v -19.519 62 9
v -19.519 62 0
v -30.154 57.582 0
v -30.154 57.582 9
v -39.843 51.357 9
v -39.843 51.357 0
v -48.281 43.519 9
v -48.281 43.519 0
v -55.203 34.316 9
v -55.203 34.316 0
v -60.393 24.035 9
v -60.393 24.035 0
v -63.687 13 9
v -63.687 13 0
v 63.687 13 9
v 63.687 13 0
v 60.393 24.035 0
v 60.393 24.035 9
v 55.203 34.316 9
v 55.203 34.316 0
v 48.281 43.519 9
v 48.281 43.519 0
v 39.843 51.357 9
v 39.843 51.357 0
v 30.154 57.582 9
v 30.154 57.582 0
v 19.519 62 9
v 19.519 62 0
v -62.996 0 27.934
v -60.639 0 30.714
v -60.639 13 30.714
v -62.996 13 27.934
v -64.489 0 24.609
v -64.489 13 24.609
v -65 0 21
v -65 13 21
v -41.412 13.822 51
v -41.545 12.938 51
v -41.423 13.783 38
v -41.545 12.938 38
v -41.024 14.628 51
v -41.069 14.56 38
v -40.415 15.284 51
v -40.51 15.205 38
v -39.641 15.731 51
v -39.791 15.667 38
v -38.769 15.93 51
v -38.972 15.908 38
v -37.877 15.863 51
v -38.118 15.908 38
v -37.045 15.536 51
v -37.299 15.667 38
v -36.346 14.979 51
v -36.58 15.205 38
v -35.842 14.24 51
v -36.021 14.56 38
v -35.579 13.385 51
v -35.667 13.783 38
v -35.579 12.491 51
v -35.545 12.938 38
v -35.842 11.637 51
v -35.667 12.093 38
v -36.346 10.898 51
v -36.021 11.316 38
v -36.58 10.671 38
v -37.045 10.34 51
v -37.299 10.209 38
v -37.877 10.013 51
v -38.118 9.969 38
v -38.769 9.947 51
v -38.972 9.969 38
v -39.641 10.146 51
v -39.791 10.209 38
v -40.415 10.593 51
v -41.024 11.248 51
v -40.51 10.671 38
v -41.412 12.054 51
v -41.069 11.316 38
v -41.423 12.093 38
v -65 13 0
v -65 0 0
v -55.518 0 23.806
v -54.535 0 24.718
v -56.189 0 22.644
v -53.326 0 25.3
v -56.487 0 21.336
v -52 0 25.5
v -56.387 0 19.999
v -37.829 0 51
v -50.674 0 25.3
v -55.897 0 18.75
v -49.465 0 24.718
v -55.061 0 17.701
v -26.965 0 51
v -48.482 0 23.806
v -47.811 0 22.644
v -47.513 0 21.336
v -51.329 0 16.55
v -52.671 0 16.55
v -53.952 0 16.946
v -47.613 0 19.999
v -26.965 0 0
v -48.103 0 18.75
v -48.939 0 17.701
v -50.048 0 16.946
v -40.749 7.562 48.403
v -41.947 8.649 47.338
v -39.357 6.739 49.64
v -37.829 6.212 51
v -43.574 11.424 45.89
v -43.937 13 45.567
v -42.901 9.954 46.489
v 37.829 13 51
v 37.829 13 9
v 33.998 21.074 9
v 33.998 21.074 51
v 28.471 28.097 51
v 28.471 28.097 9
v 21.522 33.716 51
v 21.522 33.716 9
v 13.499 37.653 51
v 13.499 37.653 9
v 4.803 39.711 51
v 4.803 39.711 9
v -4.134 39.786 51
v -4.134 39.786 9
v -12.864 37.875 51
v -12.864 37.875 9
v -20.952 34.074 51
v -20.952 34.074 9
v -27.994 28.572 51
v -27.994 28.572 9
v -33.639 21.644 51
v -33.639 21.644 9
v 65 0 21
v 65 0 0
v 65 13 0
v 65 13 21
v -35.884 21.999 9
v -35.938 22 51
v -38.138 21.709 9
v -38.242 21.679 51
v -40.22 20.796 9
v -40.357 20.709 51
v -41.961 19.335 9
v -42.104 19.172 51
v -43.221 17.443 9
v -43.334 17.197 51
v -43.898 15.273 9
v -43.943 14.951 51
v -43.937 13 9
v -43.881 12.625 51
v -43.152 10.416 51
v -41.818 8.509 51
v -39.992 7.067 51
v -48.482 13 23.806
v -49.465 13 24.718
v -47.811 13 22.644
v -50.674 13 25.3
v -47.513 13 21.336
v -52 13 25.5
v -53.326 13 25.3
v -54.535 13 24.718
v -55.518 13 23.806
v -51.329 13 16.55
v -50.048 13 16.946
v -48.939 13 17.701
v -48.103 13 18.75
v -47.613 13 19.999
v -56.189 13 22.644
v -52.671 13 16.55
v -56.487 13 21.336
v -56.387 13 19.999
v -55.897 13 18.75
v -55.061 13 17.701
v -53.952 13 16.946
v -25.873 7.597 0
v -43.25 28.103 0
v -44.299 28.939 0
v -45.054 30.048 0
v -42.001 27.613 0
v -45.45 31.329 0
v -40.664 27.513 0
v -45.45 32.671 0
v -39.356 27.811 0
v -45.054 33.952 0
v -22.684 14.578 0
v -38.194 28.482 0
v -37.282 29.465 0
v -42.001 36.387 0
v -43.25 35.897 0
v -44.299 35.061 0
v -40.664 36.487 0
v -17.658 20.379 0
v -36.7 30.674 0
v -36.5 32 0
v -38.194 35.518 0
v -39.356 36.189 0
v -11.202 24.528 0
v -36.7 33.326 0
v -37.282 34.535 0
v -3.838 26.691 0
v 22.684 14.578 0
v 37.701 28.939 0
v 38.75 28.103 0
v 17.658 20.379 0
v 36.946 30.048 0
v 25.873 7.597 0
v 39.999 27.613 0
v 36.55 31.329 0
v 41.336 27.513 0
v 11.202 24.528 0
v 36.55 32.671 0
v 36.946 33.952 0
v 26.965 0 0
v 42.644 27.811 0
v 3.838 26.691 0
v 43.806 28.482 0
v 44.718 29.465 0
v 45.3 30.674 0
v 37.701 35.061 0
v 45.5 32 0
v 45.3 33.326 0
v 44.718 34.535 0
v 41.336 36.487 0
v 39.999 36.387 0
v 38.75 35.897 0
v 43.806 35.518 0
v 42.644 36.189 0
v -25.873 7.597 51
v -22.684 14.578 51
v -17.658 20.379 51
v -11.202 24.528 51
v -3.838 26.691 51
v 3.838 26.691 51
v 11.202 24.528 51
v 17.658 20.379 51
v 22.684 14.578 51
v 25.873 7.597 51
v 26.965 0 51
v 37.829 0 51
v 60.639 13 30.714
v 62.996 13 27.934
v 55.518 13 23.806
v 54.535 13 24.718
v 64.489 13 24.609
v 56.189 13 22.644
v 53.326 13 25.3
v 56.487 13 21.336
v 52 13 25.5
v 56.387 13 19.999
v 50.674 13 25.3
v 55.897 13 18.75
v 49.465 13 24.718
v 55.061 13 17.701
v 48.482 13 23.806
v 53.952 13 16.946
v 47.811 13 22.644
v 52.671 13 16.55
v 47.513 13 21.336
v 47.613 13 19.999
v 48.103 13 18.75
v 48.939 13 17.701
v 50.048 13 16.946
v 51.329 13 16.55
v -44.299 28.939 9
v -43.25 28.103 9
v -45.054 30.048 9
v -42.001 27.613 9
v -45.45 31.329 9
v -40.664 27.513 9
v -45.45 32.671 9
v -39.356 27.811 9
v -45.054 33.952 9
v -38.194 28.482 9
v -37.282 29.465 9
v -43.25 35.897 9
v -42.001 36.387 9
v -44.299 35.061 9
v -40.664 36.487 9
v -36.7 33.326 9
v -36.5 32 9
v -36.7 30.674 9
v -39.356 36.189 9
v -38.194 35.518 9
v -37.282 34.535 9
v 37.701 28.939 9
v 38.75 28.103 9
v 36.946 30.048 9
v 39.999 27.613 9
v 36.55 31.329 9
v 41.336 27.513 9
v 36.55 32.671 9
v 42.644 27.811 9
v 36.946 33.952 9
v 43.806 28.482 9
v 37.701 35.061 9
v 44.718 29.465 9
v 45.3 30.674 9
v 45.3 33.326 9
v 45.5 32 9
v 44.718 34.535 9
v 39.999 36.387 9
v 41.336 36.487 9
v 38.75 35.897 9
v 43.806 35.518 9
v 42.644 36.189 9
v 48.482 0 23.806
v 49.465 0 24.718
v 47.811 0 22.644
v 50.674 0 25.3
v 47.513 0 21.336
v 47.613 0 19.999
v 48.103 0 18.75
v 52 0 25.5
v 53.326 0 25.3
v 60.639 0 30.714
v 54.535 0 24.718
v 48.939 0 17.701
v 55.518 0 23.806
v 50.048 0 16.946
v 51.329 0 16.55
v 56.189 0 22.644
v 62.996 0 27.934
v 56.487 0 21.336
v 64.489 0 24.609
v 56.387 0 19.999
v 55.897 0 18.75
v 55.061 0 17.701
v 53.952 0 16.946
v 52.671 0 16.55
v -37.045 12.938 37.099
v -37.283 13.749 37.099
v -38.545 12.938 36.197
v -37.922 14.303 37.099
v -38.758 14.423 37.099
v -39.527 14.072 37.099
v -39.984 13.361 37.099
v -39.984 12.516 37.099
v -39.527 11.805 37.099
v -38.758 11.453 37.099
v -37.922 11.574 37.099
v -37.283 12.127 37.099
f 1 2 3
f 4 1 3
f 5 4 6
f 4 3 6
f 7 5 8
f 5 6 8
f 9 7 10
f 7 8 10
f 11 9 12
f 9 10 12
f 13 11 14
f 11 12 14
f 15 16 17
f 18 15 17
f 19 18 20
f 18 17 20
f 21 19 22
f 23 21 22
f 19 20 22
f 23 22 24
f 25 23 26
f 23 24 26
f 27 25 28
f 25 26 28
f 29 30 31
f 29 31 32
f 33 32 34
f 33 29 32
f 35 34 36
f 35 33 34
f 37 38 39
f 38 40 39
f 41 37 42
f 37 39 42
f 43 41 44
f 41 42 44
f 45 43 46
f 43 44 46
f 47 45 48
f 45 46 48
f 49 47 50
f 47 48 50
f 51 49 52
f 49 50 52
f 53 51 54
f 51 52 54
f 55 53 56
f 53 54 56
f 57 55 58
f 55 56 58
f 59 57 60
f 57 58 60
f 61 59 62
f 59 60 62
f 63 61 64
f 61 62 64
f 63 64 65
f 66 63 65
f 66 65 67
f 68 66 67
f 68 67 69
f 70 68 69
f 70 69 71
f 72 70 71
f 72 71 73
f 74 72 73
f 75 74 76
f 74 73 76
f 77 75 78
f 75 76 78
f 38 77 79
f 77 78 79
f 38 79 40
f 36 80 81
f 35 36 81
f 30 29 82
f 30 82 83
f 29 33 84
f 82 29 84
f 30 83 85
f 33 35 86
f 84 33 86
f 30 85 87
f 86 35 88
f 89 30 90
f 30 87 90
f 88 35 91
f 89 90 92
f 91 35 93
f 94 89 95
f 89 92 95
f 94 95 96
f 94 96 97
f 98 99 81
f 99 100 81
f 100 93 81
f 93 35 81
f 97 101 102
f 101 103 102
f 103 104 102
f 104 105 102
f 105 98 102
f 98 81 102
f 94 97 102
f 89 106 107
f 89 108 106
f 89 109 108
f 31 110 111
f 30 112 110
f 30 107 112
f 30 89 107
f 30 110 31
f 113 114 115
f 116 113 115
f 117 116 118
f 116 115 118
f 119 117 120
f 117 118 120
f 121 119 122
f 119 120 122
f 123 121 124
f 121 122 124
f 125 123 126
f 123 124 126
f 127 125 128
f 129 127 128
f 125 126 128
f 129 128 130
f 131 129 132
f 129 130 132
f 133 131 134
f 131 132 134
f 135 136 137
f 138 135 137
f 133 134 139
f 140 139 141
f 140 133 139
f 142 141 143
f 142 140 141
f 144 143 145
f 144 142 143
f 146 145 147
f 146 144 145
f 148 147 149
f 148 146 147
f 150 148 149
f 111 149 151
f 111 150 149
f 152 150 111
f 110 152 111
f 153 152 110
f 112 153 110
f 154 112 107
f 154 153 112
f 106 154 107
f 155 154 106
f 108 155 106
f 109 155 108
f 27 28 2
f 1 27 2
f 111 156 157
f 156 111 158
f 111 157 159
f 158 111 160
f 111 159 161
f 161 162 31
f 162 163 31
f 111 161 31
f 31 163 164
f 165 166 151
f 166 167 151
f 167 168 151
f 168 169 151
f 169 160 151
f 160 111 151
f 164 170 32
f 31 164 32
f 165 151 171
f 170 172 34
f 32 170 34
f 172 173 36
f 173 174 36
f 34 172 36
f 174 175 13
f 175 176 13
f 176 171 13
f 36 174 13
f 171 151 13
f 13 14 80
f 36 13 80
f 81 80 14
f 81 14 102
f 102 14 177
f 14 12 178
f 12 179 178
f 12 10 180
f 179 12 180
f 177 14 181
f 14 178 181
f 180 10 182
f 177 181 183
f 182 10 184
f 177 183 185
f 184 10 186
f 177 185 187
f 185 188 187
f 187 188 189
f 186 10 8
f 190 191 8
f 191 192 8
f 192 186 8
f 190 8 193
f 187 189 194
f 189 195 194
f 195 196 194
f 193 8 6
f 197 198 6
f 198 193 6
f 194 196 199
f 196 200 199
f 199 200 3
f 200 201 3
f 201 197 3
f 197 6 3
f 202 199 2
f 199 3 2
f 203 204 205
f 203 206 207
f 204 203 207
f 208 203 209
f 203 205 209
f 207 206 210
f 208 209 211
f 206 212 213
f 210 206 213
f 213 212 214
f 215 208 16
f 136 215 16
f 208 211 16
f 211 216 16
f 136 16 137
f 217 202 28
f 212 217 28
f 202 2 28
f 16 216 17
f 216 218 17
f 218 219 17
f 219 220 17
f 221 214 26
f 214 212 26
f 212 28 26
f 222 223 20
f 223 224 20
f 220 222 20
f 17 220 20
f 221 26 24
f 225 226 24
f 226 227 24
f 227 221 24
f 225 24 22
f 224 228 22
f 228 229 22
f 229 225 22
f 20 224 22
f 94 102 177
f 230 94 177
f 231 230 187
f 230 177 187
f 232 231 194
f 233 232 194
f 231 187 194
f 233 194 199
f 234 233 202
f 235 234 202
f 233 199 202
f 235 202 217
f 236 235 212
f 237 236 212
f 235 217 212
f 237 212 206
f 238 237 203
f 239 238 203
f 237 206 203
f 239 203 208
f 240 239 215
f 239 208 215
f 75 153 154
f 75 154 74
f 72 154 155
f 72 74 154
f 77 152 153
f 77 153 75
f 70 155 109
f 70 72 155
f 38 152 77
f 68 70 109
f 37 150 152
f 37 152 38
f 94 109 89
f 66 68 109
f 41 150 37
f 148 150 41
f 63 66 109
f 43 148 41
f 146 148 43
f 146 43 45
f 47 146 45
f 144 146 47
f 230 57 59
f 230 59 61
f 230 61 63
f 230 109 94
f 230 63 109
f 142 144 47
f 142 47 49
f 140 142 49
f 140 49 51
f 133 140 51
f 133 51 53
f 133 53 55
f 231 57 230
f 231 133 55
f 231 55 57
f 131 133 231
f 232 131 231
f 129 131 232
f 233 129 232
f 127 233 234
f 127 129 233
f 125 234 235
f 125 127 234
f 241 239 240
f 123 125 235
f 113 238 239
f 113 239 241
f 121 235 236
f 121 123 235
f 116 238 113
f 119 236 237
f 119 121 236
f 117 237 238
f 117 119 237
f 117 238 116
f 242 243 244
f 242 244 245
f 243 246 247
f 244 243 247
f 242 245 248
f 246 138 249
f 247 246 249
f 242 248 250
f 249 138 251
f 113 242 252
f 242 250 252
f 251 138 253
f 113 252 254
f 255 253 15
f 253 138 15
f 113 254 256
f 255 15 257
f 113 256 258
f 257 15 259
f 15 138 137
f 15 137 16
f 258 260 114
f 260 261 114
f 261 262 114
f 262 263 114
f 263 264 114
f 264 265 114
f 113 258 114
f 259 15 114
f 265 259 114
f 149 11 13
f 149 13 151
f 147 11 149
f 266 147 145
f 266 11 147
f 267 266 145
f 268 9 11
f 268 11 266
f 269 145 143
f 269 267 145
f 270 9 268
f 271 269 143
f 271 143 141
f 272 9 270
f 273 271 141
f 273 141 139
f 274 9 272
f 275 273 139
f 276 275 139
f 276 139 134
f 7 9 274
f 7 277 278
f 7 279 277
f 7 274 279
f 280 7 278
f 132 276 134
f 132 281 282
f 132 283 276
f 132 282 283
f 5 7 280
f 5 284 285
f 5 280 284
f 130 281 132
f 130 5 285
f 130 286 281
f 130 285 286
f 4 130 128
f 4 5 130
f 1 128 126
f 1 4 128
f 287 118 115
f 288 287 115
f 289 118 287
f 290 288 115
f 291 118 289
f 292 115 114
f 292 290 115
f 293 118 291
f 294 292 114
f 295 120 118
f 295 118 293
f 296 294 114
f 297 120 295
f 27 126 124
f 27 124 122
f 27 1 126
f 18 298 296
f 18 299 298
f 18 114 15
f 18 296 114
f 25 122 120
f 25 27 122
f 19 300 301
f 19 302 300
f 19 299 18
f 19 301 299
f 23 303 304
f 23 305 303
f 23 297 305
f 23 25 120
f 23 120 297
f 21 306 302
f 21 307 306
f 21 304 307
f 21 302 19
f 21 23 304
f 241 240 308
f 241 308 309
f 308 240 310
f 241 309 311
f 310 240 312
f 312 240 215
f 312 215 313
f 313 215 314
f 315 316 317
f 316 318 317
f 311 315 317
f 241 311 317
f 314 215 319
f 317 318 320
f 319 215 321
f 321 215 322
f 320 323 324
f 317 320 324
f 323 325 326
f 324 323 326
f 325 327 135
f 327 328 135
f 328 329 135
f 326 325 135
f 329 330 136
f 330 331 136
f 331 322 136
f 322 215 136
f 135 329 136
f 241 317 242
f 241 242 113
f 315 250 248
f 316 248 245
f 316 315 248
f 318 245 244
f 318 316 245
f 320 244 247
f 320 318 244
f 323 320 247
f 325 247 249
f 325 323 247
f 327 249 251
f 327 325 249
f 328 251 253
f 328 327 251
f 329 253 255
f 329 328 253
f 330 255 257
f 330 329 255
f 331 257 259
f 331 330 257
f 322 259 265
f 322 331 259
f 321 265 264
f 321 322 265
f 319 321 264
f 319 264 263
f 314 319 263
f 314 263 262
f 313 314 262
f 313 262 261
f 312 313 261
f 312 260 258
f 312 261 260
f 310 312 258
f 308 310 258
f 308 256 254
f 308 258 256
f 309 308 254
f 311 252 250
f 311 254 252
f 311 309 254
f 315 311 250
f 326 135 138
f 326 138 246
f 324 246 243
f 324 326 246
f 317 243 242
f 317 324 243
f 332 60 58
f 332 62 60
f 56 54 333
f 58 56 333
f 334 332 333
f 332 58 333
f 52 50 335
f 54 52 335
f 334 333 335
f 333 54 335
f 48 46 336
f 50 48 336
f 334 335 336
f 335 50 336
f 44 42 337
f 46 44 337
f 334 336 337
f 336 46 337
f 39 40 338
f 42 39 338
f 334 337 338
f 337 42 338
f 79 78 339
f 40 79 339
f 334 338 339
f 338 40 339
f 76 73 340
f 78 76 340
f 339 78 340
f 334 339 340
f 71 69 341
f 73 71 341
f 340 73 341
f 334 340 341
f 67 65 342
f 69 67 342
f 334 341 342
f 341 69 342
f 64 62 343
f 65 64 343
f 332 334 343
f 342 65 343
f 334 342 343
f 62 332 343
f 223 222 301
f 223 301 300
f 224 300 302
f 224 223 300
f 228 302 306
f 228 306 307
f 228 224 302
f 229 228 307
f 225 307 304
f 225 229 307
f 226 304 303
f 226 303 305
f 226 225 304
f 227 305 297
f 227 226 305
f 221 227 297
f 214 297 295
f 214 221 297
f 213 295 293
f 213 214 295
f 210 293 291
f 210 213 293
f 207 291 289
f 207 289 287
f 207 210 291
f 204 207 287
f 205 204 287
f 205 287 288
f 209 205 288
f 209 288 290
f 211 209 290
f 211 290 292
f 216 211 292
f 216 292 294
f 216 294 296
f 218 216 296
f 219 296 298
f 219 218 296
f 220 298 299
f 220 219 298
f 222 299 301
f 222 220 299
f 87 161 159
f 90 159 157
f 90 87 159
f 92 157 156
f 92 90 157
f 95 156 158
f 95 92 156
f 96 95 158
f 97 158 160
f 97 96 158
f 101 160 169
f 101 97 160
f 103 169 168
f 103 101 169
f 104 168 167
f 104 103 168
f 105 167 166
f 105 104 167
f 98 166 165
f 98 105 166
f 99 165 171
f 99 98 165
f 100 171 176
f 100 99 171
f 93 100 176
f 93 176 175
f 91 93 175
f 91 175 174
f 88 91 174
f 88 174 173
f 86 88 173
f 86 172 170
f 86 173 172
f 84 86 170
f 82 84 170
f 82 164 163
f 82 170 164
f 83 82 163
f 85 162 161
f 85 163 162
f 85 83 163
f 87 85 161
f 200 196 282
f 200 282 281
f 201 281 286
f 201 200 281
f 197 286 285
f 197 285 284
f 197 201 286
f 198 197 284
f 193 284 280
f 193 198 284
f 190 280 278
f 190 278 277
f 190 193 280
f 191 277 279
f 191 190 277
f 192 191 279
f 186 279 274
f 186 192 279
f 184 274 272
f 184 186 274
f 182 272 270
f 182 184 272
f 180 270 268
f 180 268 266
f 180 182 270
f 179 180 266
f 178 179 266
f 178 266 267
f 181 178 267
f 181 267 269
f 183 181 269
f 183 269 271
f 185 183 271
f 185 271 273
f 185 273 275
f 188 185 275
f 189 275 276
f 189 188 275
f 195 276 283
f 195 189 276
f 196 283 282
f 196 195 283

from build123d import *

# Parameters (mm, degrees)
BOSS_EXTRUDE1_DEPTH       = 51
BOSS_EXTRUDE3_DEPTH       = 51
SKETCH2_5_R               = 4.5
BOSS_EXTRUDE4_DEPTH       = 9
CUT_EXTRUDE2_REACH        = 105.296
SKETCH3_R                 = 4.5
CUT_EXTRUDE3_REACH        = 105.296
BOSS_EXTRUDE5_REACH       = 105.296
SKETCH4_R                 = 8
F_6_0MM_DOWEL_HOLE1_D     = 6
F_6_0MM_DOWEL_HOLE1_DEPTH = 13
F_6_0MM_DOWEL_HOLE1_TIP   = 1.802581857


with BuildPart() as part:
    # Sketch2 → Boss-Extrude1 (new body)
    with BuildSketch(Plane.XY):
        with BuildLine():
            ThreePointArc((40, 0), (39.453405592, 6.590052141), (37.828560639, 13))
            ThreePointArc((37.828560639, 13), (0, 40), (-37.828560639, 13))
            ThreePointArc((-37.828560639, 13), (-39.453405592, 6.590052141), (-40, 0))
            Line((-40, 0), (-26.965, 0))
            ThreePointArc((-26.965, 0), (0, 26.965), (26.965, 0))
            Line((26.965, 0), (40, 0))
        make_face()
    extrude(amount=BOSS_EXTRUDE1_DEPTH)

    # Sketch2<4> → Boss-Extrude3 (add)
    with BuildSketch(Plane.XY):
        with BuildLine():
            ThreePointArc((-40, 0), (-39.453405592, 6.590052141), (-37.828560639, 13))
            Line((-37.828560639, 13), (-63.686733312, 13))
            Line((-63.686733312, 13), (-65, 13))
            Line((-65, 13), (-65, 0))
            Line((-65, 0), (-40, 0))
        make_face()
        with BuildLine():
            Line((63.686733312, 13), (37.828560639, 13))
            ThreePointArc((37.828560639, 13), (39.453405592, 6.590052141), (40, 0))
            Line((40, 0), (65, 0))
            Line((65, 0), (65, 13))
            Line((65, 13), (63.686733312, 13))
        make_face()
    extrude(amount=BOSS_EXTRUDE3_DEPTH)

    # Sketch2<5> → Boss-Extrude4 (add)
    with BuildSketch(Plane.XY):
        with BuildLine():
            ThreePointArc((-37.828560639, 13), (0, 40), (37.828560639, 13))
            Line((37.828560639, 13), (63.686733312, 13))
            ThreePointArc((63.686733312, 13), (48.281028578, 43.519447141), (19.519221296, 62))
            Line((19.519221296, 62), (-19.519221296, 62))
            ThreePointArc((-19.519221296, 62), (-48.281028578, 43.519447141), (-63.686733312, 13))
            Line((-63.686733312, 13), (-37.828560639, 13))
        make_face()
        with Locations((-41, 32)):
            Circle(SKETCH2_5_R, mode=Mode.SUBTRACT)
        with Locations((41, 32)):
            Circle(SKETCH2_5_R, mode=Mode.SUBTRACT)
    extrude(amount=BOSS_EXTRUDE4_DEPTH)

    # Sketch3 → Cut-Extrude2 (cut, up to next)
    with BuildSketch(Plane(origin=(0, 0, 0), x_dir=(1, 0, 0), z_dir=(0, 1, 0)), mode=Mode.PRIVATE) as cut_extrude2_sk1:
        with BuildLine():
            Line((37.828560639, -51), (65, -51))
            Line((65, -51), (65, -21))
            ThreePointArc((65, -21), (63.859756378, -26.324112946), (60.639049437, -30.714258841))
            Line((60.639049437, -30.714258841), (37.828560639, -51))
        make_face()
    cut_extrude2_tool1 = extrude(cut_extrude2_sk1.sketch, amount=CUT_EXTRUDE2_REACH, mode=Mode.PRIVATE) & part.part
    # Sketch3 → Cut-Extrude2 (cut, up to next)
    with BuildSketch(Plane(origin=(0, 0, 0), x_dir=(1, 0, 0), z_dir=(0, 1, 0)), mode=Mode.PRIVATE) as cut_extrude2_sk2:
        with Locations(Location((52, -21, 0), (0, 0, 270))):
            Circle(SKETCH3_R)
    cut_extrude2_tool2 = extrude(cut_extrude2_sk2.sketch, amount=CUT_EXTRUDE2_REACH, mode=Mode.PRIVATE) & part.part
    # Sketch3 → Cut-Extrude2 (cut, up to next)
    with BuildSketch(Plane(origin=(0, 0, 0), x_dir=(1, 0, 0), z_dir=(0, 1, 0)), mode=Mode.PRIVATE) as cut_extrude2_sk3:
        with Locations(Location((-52, -21, 0), (0, 0, 270))):
            Circle(SKETCH3_R)
    cut_extrude2_tool3 = extrude(cut_extrude2_sk3.sketch, amount=CUT_EXTRUDE2_REACH, mode=Mode.PRIVATE) & part.part
    add(cut_extrude2_tool1.solids().sort_by_distance((56.054542, 0, 42.719243))[0], mode=Mode.SUBTRACT)
    add(cut_extrude2_tool2.solids().sort_by_distance((52, 0, 21))[0], mode=Mode.SUBTRACT)
    add(cut_extrude2_tool3.solids().sort_by_distance((-52, 0, 21))[0], mode=Mode.SUBTRACT)

    # Sketch3<4> → Cut-Extrude3 (cut, up to next)
    with BuildSketch(Plane(origin=(0, 0, 0), x_dir=(1, 0, 0), z_dir=(0, 1, 0)), mode=Mode.PRIVATE) as cut_extrude3_sk1:
        with BuildLine():
            Line((-65, -51), (-37.828560639, -51))
            Line((-37.828560639, -51), (-60.639049437, -30.714258841))
            ThreePointArc((-60.639049437, -30.714258841), (-63.859756378, -26.324112946), (-65, -21))
            Line((-65, -21), (-65, -51))
        make_face()
    cut_extrude3_tool1 = extrude(cut_extrude3_sk1.sketch, amount=CUT_EXTRUDE3_REACH, mode=Mode.PRIVATE) & part.part
    add(cut_extrude3_tool1.solids().sort_by_distance((-56.054542, 0, 42.719243))[0], mode=Mode.SUBTRACT)

    # Boss-Extrude5: up to this face of the body (flat: up to its plane)
    boss_extrude5_end = Plane(part.part.faces().sort_by_distance((-47.267324257, 42.605716574, 9))[0])
    # Sketch4 → Boss-Extrude5 (add, up to the picked face)
    with BuildSketch(Plane.XY.offset(51), mode=Mode.PRIVATE) as boss_extrude5_sk1:
        with Locations((-36, 14)):
            Circle(SKETCH4_R)
    boss_extrude5_tool1 = split(extrude(boss_extrude5_sk1.sketch, amount=-BOSS_EXTRUDE5_REACH, mode=Mode.PRIVATE), bisect_by=boss_extrude5_end, keep=Keep.BOTH, mode=Mode.PRIVATE)
    add(boss_extrude5_tool1.solids().sort_by(Axis((-36, 14, 51), (0, 0, -1)))[0])

    # Ø6.0mm Dowel Hole1
    with Locations(Plane(origin=(-38.545011934, 12.938196737, 51), x_dir=(1, 0, 0), z_dir=(0, 0, 1))):
        with Locations((0, 0)):
            Hole(F_6_0MM_DOWEL_HOLE1_D / 2, depth=F_6_0MM_DOWEL_HOLE1_DEPTH)
            with Locations((0, 0, -(F_6_0MM_DOWEL_HOLE1_DEPTH + F_6_0MM_DOWEL_HOLE1_TIP / 2))):  # 118° drill point
                Cone(0, F_6_0MM_DOWEL_HOLE1_D / 2, F_6_0MM_DOWEL_HOLE1_TIP, mode=Mode.SUBTRACT)


solid = part.part
